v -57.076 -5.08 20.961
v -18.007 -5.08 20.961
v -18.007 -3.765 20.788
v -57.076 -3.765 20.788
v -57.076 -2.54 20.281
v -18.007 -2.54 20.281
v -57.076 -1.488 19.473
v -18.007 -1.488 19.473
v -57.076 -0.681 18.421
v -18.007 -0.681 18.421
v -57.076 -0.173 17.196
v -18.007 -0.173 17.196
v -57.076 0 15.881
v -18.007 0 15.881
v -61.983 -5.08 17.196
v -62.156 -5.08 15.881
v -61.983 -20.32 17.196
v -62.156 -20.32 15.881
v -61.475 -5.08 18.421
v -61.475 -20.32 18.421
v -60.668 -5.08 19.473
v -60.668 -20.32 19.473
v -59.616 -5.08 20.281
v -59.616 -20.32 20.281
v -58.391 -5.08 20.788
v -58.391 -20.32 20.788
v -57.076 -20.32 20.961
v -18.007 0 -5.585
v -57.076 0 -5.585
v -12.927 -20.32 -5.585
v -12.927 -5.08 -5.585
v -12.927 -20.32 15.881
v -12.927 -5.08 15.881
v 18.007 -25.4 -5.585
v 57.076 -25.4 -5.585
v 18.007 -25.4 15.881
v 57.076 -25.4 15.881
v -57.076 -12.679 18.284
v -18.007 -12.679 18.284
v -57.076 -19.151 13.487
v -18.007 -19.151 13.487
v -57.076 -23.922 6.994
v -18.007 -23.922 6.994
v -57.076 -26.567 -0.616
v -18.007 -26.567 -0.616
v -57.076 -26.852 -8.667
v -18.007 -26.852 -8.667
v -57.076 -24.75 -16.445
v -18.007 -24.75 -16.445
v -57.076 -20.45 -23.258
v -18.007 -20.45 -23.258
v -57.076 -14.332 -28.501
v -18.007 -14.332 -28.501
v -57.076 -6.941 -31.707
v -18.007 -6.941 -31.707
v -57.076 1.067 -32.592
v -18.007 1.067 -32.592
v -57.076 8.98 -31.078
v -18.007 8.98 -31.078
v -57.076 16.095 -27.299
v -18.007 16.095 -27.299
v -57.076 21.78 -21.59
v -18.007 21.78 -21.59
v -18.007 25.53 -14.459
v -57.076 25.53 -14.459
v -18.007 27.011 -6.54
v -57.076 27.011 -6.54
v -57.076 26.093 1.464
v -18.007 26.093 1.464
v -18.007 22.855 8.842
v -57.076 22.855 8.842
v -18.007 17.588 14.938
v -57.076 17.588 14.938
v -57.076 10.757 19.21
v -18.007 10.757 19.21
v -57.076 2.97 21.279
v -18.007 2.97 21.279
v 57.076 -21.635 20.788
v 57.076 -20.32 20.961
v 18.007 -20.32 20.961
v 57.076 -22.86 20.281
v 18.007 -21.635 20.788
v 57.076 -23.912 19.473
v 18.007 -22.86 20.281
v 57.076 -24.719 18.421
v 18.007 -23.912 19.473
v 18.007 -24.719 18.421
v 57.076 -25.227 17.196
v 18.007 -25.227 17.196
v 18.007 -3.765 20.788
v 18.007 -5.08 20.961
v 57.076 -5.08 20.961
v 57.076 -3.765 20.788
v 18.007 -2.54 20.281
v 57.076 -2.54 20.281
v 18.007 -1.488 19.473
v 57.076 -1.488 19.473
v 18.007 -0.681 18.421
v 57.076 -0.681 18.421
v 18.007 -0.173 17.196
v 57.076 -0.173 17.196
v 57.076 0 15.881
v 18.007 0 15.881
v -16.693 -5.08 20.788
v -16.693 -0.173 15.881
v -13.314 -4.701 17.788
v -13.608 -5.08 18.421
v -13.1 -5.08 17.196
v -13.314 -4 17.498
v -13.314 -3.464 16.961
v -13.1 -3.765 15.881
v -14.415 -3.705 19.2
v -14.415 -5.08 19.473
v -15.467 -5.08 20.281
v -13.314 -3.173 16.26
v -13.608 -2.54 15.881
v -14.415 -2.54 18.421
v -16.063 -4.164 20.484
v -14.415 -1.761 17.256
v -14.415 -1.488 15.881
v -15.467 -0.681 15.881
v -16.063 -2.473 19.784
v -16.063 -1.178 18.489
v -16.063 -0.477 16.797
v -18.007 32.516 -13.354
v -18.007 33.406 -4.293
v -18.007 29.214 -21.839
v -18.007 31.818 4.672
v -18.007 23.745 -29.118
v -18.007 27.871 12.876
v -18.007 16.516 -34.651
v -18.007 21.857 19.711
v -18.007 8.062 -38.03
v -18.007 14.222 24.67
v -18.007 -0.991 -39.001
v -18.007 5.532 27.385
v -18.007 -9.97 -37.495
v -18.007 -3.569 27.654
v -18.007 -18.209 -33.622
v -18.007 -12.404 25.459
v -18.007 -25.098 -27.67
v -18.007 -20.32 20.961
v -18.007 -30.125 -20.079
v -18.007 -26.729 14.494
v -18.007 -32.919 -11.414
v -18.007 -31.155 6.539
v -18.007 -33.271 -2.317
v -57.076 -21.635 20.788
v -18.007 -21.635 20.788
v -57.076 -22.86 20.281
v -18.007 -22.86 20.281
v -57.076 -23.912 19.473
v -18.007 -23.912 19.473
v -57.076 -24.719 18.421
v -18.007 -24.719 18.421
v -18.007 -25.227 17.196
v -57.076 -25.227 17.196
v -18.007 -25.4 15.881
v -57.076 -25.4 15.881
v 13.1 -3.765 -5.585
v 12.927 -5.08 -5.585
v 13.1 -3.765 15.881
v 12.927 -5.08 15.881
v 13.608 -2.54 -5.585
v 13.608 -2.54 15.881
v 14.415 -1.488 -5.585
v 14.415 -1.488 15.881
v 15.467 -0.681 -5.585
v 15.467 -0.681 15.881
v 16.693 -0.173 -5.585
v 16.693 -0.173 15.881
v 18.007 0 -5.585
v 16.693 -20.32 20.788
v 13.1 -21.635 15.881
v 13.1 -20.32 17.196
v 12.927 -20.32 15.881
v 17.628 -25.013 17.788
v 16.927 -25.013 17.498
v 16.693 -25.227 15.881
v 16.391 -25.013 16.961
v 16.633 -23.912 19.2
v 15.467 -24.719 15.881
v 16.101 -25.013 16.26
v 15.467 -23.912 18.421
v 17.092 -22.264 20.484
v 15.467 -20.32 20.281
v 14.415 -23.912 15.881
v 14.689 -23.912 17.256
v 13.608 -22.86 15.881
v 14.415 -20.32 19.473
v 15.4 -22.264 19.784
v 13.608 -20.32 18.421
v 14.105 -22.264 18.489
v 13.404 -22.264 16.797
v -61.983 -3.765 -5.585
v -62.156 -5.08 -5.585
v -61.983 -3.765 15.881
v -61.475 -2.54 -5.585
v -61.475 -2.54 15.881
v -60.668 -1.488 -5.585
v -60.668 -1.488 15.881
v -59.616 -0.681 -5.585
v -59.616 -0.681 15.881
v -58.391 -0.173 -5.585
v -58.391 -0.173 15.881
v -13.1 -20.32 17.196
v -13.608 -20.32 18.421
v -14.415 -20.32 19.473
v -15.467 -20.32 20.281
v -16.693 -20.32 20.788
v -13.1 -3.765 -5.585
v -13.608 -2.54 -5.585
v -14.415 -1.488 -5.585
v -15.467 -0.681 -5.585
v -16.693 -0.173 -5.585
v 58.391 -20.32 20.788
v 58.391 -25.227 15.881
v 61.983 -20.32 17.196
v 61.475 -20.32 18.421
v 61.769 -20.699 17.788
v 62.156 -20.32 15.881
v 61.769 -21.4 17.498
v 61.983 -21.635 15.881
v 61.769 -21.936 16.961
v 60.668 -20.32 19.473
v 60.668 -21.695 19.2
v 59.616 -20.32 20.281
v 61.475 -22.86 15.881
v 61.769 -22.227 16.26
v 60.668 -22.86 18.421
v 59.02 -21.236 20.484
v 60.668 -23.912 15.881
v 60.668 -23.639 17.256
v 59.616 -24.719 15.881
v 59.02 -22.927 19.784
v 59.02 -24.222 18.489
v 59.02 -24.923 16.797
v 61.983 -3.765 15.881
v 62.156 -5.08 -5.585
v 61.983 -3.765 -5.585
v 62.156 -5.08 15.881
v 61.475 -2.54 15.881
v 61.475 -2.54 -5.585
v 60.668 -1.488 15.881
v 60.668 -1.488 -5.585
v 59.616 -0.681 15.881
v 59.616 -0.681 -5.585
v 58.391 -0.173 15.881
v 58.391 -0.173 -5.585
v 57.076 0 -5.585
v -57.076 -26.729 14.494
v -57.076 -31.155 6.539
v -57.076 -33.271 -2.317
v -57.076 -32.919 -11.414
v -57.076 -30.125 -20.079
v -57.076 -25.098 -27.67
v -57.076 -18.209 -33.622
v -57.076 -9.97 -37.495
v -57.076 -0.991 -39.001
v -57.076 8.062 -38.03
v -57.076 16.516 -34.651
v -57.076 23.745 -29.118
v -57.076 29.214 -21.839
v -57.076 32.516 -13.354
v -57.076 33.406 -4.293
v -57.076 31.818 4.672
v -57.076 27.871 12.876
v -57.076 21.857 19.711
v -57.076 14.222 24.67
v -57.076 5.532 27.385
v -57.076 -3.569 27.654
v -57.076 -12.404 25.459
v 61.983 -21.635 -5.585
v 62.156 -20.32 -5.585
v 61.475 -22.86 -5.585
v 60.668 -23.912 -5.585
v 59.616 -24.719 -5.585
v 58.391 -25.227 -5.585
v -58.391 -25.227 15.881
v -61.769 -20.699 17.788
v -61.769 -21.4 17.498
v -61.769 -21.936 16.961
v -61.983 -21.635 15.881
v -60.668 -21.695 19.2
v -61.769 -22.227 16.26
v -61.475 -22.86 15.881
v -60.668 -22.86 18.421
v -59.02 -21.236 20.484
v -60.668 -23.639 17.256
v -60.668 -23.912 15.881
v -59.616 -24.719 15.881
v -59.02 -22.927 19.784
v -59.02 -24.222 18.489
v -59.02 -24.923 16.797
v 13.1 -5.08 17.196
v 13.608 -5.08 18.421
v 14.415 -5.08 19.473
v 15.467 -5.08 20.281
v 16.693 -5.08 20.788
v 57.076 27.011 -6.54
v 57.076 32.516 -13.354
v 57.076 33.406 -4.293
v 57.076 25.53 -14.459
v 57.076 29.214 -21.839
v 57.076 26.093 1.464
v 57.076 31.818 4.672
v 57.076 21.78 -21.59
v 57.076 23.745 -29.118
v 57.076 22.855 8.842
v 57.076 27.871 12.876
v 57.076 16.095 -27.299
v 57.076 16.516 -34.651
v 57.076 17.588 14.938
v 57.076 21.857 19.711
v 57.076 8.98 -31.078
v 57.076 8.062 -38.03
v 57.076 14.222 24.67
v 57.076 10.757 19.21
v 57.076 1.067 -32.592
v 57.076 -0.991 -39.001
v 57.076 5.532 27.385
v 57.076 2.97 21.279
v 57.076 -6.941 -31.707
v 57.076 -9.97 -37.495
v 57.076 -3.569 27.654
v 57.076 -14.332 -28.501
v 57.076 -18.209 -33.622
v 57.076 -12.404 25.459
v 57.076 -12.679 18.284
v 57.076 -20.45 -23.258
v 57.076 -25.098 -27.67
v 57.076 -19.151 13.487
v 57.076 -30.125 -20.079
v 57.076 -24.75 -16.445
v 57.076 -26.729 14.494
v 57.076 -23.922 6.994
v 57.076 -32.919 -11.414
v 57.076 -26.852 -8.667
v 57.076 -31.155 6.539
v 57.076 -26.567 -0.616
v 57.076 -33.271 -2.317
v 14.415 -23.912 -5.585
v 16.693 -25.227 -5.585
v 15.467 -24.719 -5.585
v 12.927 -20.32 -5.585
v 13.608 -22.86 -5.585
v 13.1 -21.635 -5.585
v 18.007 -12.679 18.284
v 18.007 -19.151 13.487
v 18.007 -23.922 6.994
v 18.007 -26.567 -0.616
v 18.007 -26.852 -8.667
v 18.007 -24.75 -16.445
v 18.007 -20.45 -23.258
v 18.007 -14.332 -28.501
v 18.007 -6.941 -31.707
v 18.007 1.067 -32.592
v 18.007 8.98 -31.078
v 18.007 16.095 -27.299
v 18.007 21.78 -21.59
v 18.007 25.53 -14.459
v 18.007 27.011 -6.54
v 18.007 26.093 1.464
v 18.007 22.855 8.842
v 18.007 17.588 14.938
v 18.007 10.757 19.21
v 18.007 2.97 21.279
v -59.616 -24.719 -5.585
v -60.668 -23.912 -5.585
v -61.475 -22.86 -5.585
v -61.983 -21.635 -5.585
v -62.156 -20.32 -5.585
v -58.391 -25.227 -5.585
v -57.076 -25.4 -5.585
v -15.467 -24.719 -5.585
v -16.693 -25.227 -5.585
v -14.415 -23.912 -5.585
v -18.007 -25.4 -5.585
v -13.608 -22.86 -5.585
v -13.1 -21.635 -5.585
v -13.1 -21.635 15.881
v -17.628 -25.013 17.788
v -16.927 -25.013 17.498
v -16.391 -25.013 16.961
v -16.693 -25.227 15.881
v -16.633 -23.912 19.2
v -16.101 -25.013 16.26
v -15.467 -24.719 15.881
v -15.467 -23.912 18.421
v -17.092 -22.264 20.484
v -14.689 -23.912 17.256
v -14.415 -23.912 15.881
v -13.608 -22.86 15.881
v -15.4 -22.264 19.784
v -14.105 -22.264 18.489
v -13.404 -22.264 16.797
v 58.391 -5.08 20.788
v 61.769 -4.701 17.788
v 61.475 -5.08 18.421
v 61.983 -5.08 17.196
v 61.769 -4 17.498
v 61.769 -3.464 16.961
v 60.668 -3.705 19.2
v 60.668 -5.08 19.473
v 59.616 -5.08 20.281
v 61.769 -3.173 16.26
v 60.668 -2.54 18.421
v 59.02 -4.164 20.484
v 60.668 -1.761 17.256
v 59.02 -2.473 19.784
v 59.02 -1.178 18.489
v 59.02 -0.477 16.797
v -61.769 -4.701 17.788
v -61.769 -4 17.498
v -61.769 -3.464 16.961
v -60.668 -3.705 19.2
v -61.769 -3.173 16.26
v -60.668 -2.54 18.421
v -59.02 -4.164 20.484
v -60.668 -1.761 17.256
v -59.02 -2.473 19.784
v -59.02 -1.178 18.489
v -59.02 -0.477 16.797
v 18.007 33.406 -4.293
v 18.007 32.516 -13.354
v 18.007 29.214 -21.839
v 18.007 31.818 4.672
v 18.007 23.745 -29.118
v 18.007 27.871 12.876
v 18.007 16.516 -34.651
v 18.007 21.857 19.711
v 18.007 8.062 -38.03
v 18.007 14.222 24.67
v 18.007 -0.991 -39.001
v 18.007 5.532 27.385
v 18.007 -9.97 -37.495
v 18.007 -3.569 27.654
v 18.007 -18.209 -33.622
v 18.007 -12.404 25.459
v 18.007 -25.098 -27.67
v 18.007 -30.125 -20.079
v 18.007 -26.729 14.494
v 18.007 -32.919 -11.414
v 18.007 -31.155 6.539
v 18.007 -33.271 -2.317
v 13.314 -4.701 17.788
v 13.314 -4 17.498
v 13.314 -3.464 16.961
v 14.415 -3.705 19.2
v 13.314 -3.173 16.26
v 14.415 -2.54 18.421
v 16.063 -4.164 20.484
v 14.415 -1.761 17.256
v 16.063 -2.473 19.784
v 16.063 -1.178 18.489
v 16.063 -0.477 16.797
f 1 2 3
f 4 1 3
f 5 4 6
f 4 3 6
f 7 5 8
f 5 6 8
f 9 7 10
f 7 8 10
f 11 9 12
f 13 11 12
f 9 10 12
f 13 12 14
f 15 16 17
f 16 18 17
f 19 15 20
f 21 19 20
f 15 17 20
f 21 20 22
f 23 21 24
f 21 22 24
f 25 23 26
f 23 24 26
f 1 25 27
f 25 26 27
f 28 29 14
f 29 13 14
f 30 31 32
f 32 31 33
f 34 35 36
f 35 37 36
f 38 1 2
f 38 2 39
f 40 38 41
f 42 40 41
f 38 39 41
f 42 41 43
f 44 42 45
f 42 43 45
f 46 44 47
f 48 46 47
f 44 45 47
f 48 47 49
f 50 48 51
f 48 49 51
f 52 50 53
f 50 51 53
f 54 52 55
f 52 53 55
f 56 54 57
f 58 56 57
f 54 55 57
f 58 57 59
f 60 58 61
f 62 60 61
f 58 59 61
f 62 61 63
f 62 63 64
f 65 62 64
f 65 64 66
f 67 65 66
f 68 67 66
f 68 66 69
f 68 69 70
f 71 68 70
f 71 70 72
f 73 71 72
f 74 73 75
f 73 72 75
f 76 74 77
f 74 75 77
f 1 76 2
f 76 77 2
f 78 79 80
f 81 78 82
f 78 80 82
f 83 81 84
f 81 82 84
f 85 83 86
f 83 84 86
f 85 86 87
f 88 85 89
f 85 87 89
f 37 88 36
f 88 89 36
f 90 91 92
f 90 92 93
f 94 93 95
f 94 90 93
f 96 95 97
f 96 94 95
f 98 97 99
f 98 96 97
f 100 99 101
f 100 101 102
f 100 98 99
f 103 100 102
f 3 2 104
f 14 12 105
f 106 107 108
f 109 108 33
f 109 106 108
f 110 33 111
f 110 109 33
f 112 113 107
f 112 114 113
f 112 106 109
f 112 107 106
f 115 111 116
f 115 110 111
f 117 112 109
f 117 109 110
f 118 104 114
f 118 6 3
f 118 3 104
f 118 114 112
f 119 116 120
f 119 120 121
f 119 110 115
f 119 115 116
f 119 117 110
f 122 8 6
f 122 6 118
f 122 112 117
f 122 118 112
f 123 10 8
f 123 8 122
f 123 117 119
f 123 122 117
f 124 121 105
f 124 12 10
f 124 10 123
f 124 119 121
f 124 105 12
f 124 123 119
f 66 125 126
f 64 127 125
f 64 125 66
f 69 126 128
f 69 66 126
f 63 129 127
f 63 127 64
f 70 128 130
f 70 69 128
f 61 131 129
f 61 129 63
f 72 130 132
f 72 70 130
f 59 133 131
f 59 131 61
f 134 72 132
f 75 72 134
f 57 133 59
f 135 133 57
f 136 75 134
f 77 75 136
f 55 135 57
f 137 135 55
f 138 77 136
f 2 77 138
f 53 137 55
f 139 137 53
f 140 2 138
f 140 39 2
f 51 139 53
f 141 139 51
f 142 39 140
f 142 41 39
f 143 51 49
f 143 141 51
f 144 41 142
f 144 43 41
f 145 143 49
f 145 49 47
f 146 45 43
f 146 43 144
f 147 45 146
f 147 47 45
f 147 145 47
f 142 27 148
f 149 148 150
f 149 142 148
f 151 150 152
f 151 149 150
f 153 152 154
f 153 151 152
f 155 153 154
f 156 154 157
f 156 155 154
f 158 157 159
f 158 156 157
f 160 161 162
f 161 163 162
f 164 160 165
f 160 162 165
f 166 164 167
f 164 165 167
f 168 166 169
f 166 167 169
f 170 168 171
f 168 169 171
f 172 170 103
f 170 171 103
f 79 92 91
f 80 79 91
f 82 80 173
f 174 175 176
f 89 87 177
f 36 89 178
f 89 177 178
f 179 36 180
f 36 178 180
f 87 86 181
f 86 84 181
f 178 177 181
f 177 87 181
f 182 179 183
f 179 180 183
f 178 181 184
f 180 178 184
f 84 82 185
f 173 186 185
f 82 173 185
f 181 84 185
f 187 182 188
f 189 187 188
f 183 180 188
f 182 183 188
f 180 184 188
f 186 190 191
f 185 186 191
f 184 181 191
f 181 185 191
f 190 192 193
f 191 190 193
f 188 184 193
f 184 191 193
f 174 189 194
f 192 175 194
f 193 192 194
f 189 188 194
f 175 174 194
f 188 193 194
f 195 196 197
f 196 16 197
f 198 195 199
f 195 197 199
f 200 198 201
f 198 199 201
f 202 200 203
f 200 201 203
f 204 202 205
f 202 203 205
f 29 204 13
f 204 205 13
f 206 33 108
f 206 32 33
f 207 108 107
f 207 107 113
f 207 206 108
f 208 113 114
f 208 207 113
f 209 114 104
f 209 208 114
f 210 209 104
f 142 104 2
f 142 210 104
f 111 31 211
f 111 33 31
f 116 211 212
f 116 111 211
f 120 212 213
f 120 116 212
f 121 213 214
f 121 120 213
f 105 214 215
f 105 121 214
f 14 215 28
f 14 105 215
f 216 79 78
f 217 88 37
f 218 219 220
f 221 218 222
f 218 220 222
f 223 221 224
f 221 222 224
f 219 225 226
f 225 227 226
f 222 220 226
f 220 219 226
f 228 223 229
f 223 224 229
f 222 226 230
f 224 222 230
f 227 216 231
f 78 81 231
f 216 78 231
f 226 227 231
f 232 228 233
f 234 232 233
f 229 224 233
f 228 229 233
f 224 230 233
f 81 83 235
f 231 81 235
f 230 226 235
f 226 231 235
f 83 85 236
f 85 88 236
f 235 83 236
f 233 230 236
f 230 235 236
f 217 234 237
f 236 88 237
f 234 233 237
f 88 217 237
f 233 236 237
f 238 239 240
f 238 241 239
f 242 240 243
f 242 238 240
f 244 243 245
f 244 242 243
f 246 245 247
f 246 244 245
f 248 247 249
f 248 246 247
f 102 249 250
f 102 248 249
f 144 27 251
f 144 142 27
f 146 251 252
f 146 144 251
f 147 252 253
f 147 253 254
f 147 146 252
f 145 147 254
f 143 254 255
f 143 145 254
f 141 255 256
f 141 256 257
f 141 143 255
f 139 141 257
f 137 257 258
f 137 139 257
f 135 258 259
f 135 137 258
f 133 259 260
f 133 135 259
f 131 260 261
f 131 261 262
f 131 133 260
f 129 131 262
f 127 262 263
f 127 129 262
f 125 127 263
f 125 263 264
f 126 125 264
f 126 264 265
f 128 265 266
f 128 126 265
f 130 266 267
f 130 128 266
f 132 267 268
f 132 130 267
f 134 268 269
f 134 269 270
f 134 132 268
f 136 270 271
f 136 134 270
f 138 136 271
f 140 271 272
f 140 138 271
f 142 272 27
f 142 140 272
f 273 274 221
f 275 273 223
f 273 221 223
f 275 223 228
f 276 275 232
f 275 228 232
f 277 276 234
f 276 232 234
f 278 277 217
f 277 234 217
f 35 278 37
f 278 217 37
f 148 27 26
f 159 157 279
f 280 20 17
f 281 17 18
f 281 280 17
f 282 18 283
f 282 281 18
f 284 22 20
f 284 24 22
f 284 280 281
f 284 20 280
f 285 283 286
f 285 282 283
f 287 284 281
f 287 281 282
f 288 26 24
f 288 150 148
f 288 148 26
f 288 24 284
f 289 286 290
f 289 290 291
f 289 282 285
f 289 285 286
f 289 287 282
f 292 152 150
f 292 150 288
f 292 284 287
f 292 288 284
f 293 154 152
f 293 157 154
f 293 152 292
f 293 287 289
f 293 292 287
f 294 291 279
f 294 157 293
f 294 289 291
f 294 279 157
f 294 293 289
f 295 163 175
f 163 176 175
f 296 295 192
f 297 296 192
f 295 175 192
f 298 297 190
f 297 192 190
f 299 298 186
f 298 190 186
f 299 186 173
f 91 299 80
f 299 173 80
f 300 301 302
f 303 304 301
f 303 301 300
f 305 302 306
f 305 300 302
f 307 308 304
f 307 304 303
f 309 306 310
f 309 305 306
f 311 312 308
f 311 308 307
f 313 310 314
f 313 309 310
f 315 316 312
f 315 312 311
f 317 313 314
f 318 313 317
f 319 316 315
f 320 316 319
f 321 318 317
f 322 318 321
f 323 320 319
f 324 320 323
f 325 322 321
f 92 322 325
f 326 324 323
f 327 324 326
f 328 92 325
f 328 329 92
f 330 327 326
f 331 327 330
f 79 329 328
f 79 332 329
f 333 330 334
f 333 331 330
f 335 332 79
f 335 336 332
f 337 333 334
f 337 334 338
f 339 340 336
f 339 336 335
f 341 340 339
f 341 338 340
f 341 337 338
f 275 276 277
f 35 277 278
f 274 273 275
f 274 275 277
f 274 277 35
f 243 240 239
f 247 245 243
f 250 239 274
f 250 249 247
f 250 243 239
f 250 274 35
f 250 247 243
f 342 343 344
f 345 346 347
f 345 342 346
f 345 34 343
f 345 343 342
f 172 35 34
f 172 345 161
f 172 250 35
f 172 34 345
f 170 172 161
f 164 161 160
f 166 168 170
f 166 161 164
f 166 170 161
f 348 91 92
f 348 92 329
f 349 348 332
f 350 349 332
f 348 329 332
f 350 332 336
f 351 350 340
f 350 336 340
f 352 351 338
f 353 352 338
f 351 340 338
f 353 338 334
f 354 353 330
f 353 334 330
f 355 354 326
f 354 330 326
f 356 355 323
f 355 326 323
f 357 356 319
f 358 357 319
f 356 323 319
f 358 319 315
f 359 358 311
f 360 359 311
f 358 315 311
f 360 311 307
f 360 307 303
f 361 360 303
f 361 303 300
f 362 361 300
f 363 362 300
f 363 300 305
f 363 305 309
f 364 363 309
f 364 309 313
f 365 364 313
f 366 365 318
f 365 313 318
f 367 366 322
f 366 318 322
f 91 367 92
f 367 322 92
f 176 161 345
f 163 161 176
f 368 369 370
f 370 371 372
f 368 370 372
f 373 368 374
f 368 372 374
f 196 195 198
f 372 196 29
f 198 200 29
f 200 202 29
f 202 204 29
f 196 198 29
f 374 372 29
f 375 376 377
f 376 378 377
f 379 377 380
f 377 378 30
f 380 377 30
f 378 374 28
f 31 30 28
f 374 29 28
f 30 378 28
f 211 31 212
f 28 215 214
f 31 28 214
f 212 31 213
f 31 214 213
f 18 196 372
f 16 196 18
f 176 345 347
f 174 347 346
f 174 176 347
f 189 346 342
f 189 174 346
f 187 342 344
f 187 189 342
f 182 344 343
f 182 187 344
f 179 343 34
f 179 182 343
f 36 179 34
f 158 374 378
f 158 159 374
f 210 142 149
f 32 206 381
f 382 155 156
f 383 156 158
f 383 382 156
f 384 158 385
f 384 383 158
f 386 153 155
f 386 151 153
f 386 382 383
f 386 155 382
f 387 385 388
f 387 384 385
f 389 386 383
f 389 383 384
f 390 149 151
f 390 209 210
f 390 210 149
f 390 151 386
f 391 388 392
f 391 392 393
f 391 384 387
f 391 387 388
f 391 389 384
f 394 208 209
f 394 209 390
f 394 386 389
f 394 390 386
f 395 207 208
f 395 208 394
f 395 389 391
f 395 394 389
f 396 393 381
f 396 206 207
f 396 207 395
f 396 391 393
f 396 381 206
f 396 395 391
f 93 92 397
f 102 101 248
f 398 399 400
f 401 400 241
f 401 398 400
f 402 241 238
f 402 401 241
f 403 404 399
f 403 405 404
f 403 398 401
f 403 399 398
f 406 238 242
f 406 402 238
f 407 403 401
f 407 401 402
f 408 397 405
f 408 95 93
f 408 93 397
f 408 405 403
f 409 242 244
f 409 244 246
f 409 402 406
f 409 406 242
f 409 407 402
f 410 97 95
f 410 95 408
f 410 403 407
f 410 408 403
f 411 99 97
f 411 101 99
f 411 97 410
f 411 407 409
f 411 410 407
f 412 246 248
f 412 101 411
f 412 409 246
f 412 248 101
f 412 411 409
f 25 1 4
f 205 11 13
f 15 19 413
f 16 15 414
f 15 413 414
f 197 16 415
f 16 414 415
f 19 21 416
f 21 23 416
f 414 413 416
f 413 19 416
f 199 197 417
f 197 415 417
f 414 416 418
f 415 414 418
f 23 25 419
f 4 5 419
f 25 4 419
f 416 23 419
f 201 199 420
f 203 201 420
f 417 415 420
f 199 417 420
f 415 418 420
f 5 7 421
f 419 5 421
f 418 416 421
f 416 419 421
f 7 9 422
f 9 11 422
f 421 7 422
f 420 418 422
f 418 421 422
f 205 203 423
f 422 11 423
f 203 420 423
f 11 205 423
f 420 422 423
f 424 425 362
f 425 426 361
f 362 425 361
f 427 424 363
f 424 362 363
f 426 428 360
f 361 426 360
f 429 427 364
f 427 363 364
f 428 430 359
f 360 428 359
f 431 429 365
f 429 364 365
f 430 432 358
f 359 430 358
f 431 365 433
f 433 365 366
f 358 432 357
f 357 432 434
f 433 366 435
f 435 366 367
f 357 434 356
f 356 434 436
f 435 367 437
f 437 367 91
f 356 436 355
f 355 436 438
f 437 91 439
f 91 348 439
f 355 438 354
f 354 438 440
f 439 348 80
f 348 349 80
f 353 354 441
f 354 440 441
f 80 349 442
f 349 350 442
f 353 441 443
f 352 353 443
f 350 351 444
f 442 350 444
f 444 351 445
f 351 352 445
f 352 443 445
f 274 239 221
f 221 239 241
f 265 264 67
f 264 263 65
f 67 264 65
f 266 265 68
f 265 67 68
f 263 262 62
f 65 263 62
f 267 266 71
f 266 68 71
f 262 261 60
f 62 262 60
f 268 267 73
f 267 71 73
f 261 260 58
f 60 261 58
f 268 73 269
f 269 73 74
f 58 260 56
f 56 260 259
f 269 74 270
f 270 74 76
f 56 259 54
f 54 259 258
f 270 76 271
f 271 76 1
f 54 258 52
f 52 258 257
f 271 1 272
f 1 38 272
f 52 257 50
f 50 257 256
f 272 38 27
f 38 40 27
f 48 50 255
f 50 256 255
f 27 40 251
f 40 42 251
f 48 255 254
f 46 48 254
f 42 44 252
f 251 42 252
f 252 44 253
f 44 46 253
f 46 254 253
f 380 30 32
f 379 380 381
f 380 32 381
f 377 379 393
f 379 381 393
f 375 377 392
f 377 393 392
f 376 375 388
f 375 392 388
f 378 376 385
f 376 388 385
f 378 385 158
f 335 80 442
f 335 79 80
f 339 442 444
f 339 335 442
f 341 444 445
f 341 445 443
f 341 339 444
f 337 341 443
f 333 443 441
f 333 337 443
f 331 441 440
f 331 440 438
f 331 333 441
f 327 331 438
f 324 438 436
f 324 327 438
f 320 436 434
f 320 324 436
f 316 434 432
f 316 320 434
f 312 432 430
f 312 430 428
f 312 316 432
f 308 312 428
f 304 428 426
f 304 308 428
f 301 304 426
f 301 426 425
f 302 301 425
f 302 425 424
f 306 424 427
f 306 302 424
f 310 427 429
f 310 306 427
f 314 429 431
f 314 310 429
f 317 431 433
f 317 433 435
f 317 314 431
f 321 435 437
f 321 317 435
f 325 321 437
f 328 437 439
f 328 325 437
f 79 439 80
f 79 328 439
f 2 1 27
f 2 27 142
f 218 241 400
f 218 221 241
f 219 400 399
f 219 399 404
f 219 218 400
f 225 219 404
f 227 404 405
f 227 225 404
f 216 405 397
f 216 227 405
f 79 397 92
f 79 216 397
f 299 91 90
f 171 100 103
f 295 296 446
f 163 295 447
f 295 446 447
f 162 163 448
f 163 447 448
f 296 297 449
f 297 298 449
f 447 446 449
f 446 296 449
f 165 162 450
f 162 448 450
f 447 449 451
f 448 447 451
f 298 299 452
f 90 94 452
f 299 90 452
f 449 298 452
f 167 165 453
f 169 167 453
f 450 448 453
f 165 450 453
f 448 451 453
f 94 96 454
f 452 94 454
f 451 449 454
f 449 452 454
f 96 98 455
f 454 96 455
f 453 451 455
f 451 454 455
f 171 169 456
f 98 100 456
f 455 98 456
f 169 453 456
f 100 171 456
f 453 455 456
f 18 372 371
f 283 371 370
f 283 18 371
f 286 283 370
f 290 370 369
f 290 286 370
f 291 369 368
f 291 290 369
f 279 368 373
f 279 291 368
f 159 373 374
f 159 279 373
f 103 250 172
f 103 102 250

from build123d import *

# Parameters (mm, degrees)
F0_W      = 49.2286197841
F0_H      = 26.5464654658
F1_DEPTH  = 25.4
F2_R      = 5.08
F3_FACE_W = 39.0686197841
F3_FACE_H = 15.24
F1_FACE_W = 39.0686197841
F1_FACE_H = 15.24


with BuildPart() as f1:
    # F0 (on Front) → F1 (new body)
    with BuildSketch(Plane.XZ):
        with Locations((-37.5417005271, 7.6879252447)):
            Rectangle(F0_W, F0_H)
    extrude(amount=F1_DEPTH)

    # F2
    f2_edges = [f1.edges().sort_by_distance(p)[0] for p in [
        (-37.541701, 0, 20.961158),
        (-12.927391, -12.7, 20.961158),
        (-37.541701, -25.4, 20.961158),
        (-62.15601, -12.7, 20.961158),
        (-62.15601, -25.4, 7.687925),
        (-12.927391, -25.4, 7.687925),
        (-12.927391, 0, 7.687925),
        (-62.15601, 0, 7.687925),
    ]]
    fillet(f2_edges, radius=F2_R)


with BuildPart() as f3_1:
    # F3: instance of F1
    add(f1.part.mirror(Plane.YZ))


with BuildPart() as f4:
    # F3_face (on face) → F4 (revolve)
    with BuildSketch(Plane(origin=(37.5417005271, -12.7, 20.9611579776), x_dir=(1, 0, 0), z_dir=(0, 0, 1))):
        Rectangle(F3_FACE_W, F3_FACE_H)
    revolve(axis=Axis((-37.5417005271, 0, -5.5853074882), (1, 0, 0)))


with BuildPart() as f4b:
    # F1_face (on face) → F4, piece 2 (revolve)
    with BuildSketch(Plane(origin=(-37.5417005271, -12.7, 20.9611579776), x_dir=(1, 0, 0), z_dir=(0, 0, 1))):
        Rectangle(F1_FACE_W, F1_FACE_H)
    revolve(axis=Axis((-37.5417005271, 0, -5.5853074882), (1, 0, 0)))


solid = Compound([f1.part, f3_1.part, f4.part, f4b.part])
